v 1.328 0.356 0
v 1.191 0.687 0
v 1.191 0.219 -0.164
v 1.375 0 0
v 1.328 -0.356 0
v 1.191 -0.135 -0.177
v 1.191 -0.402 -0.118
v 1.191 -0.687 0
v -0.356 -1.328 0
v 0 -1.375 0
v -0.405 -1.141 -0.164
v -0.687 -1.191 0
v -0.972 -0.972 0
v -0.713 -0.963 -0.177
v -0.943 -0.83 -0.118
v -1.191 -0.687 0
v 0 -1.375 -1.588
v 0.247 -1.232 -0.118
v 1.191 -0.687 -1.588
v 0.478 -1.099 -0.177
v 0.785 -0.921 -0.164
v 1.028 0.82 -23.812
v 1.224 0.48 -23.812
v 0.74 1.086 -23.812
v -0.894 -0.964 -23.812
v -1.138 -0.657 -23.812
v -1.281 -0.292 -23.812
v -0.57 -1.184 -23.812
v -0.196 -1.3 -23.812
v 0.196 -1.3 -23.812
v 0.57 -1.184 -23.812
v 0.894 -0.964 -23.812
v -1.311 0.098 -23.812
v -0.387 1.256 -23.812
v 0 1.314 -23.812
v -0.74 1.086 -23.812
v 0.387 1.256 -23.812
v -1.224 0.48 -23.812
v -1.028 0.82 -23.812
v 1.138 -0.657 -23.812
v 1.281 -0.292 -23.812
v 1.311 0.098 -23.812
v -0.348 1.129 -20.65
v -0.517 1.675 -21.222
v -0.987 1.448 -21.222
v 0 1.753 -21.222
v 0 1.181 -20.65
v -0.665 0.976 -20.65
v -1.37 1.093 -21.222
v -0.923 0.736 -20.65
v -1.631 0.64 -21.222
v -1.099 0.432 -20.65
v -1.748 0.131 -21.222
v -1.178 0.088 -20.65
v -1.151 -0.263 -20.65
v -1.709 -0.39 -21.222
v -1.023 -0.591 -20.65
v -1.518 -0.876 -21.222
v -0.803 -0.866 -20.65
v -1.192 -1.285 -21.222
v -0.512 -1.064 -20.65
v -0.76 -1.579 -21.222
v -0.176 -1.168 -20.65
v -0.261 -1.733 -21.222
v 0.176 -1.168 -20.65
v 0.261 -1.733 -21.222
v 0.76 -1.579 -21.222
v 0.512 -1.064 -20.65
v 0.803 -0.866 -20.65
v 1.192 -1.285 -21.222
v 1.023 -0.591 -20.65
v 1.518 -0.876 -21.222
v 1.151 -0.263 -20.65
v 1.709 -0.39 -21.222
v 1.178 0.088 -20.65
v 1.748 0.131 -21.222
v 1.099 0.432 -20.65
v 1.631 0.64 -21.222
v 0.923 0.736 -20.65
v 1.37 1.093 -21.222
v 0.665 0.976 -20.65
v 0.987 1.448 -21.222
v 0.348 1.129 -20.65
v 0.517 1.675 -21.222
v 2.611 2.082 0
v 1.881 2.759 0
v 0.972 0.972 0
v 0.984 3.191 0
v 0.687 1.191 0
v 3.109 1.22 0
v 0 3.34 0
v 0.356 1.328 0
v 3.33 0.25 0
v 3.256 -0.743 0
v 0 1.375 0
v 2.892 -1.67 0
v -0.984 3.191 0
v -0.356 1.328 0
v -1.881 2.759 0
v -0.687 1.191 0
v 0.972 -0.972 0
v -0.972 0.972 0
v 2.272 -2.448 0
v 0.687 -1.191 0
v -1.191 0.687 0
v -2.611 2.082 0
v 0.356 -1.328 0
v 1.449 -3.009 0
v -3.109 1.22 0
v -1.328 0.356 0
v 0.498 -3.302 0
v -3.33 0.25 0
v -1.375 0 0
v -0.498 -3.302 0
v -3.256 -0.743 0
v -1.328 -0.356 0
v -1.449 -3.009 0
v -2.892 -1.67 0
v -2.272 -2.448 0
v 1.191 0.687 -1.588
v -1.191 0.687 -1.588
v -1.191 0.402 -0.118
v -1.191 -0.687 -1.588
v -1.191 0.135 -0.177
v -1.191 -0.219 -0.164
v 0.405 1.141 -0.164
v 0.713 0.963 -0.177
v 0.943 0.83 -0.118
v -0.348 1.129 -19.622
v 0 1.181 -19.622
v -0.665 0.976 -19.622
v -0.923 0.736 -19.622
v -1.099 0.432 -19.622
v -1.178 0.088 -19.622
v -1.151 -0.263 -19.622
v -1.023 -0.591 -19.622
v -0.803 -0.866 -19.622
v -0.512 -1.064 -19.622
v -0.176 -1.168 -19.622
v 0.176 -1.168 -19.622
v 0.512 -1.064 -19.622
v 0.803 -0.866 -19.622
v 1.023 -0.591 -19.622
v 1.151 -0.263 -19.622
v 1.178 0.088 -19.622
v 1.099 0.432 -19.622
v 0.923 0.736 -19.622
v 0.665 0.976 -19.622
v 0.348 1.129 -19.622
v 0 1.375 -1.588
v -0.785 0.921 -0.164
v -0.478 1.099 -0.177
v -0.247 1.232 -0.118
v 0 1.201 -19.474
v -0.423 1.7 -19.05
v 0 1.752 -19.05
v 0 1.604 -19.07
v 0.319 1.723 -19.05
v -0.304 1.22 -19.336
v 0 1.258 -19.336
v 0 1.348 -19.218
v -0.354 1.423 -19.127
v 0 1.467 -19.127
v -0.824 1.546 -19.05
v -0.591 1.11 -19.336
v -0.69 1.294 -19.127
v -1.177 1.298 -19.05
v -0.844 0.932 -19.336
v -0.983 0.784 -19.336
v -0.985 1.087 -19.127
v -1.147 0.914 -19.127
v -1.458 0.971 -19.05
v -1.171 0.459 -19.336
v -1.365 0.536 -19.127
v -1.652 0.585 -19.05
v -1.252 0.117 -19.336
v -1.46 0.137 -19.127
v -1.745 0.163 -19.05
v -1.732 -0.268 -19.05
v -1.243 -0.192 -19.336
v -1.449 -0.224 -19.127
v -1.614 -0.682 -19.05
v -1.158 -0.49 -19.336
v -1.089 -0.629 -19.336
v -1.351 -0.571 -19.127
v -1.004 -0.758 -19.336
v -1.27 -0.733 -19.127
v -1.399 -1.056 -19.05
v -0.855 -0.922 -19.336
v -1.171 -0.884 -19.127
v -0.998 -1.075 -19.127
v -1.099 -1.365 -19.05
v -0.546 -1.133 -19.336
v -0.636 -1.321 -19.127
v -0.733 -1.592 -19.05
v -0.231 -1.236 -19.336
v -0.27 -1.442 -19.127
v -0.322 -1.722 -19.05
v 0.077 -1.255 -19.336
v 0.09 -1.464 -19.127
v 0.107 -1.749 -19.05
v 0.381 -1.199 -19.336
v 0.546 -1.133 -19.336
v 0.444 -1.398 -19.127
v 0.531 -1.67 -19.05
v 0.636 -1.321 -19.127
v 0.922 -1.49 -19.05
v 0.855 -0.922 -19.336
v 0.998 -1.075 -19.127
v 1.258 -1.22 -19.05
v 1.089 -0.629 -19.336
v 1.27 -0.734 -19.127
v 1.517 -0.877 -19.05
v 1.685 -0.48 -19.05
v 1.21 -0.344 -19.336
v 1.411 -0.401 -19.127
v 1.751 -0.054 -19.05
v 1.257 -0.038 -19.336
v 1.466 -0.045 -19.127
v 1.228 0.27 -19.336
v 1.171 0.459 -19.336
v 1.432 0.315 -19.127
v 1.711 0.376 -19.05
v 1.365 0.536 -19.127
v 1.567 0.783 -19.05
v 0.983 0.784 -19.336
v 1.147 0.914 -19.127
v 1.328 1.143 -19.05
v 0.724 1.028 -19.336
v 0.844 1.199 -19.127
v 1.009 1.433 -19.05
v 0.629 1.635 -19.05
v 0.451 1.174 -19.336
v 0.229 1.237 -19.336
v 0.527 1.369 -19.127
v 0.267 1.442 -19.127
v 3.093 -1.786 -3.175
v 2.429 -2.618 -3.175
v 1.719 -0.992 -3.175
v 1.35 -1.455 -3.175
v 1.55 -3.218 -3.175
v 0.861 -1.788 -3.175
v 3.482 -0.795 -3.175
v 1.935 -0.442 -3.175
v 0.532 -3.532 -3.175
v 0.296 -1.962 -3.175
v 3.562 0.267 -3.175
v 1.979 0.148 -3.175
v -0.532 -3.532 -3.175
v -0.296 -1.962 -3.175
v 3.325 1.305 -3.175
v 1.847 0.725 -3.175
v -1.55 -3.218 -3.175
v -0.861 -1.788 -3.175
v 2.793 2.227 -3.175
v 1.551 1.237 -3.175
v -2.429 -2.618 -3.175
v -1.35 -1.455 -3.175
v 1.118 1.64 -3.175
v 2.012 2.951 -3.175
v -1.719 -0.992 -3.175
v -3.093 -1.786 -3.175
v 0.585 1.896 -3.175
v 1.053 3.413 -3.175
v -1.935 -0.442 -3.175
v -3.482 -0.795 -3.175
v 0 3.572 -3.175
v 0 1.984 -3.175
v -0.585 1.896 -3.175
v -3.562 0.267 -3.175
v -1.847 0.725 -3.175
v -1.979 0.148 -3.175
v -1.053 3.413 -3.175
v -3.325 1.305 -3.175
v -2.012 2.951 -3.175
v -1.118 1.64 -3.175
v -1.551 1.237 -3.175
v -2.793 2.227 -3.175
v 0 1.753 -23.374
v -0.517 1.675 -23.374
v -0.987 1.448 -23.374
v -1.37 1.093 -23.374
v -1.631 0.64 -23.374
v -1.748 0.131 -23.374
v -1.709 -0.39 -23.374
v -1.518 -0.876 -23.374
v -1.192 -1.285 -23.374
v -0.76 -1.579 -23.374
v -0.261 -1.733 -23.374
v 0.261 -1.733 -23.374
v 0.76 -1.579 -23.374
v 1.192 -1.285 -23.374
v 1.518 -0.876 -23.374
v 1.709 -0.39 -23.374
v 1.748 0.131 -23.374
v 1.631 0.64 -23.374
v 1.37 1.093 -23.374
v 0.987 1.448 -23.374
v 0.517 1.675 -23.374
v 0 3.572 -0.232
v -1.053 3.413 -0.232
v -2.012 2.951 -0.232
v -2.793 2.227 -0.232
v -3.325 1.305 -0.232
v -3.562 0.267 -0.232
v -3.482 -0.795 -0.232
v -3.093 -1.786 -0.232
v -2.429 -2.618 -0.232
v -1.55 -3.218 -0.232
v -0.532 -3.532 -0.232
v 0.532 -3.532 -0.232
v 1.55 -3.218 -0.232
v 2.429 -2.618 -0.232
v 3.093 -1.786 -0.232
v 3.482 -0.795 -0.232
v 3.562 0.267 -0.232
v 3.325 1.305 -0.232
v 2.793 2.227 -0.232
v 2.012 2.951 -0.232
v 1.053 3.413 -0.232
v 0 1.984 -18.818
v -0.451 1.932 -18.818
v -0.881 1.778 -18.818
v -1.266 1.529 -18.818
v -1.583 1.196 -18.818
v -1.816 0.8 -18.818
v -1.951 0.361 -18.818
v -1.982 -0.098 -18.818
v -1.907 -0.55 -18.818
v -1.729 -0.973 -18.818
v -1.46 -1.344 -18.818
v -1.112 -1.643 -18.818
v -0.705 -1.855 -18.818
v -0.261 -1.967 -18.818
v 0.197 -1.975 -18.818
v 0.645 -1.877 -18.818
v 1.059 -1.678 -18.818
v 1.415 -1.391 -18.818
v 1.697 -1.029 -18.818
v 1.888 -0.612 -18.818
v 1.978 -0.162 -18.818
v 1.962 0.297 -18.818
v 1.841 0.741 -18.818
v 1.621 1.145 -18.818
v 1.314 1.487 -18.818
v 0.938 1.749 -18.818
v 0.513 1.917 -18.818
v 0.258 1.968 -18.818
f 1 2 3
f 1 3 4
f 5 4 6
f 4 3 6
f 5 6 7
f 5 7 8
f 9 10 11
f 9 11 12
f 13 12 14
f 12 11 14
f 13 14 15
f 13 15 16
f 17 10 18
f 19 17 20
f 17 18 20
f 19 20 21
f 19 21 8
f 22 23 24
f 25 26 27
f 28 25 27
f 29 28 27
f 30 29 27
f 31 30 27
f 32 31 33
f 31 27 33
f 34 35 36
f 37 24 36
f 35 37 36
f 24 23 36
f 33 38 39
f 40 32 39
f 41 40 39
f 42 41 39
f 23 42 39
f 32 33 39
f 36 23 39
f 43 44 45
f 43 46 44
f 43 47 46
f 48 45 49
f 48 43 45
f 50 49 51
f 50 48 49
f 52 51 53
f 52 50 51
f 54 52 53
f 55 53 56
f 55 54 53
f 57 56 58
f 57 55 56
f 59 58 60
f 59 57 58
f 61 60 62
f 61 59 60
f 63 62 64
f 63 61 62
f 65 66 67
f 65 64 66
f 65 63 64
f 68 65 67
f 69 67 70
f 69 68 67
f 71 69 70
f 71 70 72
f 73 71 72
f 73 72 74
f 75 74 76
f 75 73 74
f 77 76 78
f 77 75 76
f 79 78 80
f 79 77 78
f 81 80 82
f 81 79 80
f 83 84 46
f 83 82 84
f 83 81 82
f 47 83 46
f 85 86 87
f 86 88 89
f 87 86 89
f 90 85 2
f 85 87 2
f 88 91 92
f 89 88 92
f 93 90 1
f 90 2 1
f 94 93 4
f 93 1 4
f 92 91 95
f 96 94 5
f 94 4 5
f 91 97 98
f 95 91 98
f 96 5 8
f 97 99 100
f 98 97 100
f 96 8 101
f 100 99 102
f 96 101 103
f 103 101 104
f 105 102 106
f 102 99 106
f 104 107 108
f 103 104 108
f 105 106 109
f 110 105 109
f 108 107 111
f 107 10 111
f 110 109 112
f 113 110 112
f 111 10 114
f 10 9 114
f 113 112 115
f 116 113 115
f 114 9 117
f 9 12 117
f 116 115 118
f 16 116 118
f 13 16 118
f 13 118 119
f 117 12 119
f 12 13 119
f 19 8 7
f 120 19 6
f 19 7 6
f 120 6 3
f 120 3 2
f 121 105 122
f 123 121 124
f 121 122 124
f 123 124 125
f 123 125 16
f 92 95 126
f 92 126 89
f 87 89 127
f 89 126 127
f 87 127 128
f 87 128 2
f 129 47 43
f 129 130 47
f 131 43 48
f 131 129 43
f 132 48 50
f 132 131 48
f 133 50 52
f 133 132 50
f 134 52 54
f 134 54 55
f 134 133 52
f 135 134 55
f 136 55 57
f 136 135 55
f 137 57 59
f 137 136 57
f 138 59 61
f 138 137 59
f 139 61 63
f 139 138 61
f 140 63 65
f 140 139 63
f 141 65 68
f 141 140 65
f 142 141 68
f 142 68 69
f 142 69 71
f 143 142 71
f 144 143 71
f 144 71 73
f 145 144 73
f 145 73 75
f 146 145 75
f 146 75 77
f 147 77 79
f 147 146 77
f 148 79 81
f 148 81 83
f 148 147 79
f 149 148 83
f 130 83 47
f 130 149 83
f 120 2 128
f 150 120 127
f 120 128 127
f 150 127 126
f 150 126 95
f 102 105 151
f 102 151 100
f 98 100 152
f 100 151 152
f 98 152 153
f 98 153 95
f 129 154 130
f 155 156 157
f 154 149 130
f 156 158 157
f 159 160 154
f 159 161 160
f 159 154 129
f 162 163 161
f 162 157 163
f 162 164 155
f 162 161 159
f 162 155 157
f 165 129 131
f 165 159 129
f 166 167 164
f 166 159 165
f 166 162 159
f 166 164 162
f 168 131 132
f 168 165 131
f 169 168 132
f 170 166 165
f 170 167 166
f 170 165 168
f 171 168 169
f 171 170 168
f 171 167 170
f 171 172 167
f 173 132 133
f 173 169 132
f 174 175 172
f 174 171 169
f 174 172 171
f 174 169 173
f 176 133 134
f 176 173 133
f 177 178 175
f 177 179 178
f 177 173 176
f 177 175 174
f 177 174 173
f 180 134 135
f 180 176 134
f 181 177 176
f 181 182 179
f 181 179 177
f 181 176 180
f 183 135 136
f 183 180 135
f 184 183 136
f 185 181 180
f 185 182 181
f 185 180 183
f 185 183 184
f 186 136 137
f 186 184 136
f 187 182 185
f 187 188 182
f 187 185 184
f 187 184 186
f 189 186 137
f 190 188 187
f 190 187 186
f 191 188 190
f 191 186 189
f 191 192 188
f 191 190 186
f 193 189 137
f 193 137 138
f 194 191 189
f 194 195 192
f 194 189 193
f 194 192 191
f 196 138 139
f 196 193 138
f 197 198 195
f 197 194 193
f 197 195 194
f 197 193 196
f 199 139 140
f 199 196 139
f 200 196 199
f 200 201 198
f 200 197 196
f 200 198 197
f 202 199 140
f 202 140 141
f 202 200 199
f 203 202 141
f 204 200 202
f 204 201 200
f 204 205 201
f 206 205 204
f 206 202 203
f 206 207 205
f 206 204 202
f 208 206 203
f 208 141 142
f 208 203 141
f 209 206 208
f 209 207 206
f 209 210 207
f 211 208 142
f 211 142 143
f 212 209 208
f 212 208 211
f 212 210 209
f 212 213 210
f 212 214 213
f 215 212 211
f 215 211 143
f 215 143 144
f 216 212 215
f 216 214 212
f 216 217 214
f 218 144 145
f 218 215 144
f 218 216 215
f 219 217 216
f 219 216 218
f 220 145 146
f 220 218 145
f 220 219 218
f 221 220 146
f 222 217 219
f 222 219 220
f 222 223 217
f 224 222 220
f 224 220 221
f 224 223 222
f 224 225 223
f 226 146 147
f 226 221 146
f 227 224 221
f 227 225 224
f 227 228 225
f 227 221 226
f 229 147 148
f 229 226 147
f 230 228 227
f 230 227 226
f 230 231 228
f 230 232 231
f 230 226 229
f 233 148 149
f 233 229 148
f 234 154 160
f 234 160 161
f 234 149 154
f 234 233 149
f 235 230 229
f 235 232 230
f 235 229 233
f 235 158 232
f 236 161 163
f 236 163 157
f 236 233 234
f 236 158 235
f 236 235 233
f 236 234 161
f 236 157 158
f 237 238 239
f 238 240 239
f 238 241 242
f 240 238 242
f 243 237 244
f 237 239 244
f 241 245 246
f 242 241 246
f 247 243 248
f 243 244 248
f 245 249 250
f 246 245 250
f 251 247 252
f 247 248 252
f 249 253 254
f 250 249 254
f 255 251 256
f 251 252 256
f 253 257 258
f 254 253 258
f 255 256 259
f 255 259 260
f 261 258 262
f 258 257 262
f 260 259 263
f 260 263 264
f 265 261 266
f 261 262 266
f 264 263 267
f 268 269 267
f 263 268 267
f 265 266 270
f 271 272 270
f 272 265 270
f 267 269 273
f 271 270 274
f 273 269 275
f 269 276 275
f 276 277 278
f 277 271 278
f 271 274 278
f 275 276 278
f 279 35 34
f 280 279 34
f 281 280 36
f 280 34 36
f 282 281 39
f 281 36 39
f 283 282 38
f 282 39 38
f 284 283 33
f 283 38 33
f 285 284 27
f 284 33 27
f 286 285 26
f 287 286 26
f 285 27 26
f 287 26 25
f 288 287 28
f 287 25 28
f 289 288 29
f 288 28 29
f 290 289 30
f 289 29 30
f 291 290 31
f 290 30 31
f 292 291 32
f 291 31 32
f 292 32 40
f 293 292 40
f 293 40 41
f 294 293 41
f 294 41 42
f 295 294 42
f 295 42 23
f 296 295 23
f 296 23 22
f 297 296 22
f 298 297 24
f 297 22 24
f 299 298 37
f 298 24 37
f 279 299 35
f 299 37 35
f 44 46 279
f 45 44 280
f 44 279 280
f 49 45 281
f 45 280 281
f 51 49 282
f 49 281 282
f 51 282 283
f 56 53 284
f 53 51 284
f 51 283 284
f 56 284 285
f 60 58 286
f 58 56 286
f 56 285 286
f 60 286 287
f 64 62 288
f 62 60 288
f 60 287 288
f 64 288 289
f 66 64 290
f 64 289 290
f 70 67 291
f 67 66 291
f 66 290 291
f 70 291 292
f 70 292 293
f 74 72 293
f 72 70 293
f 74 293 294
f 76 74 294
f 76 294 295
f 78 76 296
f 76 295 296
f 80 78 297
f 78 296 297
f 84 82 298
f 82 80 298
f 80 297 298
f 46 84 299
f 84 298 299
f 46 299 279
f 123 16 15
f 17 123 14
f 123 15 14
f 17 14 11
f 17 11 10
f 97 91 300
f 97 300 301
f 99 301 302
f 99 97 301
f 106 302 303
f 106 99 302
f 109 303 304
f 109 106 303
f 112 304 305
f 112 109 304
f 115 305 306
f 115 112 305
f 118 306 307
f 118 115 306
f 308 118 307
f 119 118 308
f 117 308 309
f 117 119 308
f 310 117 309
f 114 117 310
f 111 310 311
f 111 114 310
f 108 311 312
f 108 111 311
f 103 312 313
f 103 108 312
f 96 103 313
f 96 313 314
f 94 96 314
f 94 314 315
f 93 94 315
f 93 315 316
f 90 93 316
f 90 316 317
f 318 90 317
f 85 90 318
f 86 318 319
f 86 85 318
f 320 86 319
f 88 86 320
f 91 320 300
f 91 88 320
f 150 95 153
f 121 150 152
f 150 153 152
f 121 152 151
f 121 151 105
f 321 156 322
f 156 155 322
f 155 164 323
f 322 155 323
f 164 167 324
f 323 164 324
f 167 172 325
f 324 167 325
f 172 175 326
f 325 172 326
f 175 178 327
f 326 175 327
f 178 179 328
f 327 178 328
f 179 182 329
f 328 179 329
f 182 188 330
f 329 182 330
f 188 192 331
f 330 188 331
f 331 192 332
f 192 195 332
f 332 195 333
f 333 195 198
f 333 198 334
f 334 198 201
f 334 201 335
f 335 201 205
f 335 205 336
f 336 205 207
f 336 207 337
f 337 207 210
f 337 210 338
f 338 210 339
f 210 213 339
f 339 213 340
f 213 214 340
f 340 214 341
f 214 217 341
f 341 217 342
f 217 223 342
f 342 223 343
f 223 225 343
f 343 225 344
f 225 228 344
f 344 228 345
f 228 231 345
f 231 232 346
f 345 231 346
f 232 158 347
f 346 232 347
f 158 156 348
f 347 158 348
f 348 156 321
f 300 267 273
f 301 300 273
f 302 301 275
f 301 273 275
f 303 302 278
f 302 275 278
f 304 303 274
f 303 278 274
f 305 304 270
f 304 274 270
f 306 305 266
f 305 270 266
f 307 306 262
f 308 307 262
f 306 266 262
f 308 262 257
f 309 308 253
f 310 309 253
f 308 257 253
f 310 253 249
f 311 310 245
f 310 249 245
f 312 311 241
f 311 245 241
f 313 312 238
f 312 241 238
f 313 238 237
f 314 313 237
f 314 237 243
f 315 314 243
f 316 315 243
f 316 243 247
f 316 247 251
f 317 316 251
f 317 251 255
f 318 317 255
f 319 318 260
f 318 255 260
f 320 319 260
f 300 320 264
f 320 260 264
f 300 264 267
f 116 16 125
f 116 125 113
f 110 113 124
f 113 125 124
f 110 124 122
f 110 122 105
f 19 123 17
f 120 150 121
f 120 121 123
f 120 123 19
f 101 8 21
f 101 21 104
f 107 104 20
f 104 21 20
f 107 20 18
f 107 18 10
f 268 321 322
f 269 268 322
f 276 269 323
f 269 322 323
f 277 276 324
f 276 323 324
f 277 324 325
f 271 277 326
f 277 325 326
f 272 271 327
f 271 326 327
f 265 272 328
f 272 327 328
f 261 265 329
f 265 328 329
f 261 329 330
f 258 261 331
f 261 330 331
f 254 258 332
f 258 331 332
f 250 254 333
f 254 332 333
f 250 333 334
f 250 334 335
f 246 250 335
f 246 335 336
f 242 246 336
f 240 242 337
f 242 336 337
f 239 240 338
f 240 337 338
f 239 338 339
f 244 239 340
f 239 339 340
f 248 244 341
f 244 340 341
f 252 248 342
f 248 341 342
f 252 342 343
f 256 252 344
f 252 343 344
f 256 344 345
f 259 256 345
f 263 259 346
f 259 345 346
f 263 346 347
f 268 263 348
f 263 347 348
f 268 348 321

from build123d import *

# Parameters (mm, degrees)
CHAMFER1_SIZE      = 0.43815
CHAMFER2_SIZE      = 0.232171875
CUT_EXTRUDE2_DEPTH = 1.5875


with BuildPart() as part:
    # Sketch1 → Revolve1 (revolve)
    with BuildSketch(Plane(origin=(0, 0, 0), x_dir=(0, 0, -1), z_dir=(1, 0, 0))):
        Polygon((0, 3.571875), (3.175, 3.571875), (3.175, 1.984375), (19.05, 1.984375), (19.05, 1.7526), (23.8125, 1.7526), (23.8125, 0), (0, 0), align=None)
    revolve(axis=Axis((0, 0, -23.8125), (0, 0, 1)))

    # Sketch5 → Cut-Revolve1 (revolve, cut)
    with BuildSketch(Plane(origin=(0, 0, 0), x_dir=(0, 0, -1), z_dir=(1, 0, 0))):
        with BuildLine():
            Line((19.05, 1.984375), (21.453475, 1.984375))
            Line((21.453475, 1.984375), (20.6502, 1.1811))
            Line((20.6502, 1.1811), (19.6215, 1.1811))
            ThreePointArc((19.6215, 1.1811), (19.217388475, 1.348488475), (19.05, 1.7526))
            Line((19.05, 1.7526), (19.05, 1.984375))
        make_face()
    revolve(axis=Axis((0, 0, -23.8125), (0, 0, 1)), mode=Mode.SUBTRACT)

    # Chamfer1
    chamfer1_edges = [part.edges().sort_by_distance(p)[0] for p in [
        (0, -1.7526, -23.8125),
    ]]
    chamfer(chamfer1_edges, length=CHAMFER1_SIZE)

    # Chamfer2
    chamfer2_edges = [part.edges().sort_by_distance(p)[0] for p in [
        (0, -1.984375, -19.05),
        (0, -3.571875, 0),
    ]]
    chamfer(chamfer2_edges, length=CHAMFER2_SIZE)

    # Sketch8 → Cut-Extrude2 (cut)
    with BuildSketch(Plane.XY):
        Polygon((1.190625, 0.687407664), (0, 1.374815329), (-1.190625, 0.687407664), (-1.190625, -0.687407664), (0, -1.374815329), (1.190625, -0.687407664), align=None)
    extrude(amount=-CUT_EXTRUDE2_DEPTH, mode=Mode.SUBTRACT)

    # Cut-Extrude4 cone 1 section (through the dimple's axis) → Cut-Extrude4 (revolve, cut)
    with BuildSketch(Plane(origin=(0, 0, 0), x_dir=(0, -1, 0), z_dir=(1, 0, 0))):
        Polygon((0, 0), (1.374815329, 0), (0, 1.374815329), align=None)
    revolve(axis=Axis((0, 0, 0), (0, 0, -1)), mode=Mode.SUBTRACT)


solid = part.part
